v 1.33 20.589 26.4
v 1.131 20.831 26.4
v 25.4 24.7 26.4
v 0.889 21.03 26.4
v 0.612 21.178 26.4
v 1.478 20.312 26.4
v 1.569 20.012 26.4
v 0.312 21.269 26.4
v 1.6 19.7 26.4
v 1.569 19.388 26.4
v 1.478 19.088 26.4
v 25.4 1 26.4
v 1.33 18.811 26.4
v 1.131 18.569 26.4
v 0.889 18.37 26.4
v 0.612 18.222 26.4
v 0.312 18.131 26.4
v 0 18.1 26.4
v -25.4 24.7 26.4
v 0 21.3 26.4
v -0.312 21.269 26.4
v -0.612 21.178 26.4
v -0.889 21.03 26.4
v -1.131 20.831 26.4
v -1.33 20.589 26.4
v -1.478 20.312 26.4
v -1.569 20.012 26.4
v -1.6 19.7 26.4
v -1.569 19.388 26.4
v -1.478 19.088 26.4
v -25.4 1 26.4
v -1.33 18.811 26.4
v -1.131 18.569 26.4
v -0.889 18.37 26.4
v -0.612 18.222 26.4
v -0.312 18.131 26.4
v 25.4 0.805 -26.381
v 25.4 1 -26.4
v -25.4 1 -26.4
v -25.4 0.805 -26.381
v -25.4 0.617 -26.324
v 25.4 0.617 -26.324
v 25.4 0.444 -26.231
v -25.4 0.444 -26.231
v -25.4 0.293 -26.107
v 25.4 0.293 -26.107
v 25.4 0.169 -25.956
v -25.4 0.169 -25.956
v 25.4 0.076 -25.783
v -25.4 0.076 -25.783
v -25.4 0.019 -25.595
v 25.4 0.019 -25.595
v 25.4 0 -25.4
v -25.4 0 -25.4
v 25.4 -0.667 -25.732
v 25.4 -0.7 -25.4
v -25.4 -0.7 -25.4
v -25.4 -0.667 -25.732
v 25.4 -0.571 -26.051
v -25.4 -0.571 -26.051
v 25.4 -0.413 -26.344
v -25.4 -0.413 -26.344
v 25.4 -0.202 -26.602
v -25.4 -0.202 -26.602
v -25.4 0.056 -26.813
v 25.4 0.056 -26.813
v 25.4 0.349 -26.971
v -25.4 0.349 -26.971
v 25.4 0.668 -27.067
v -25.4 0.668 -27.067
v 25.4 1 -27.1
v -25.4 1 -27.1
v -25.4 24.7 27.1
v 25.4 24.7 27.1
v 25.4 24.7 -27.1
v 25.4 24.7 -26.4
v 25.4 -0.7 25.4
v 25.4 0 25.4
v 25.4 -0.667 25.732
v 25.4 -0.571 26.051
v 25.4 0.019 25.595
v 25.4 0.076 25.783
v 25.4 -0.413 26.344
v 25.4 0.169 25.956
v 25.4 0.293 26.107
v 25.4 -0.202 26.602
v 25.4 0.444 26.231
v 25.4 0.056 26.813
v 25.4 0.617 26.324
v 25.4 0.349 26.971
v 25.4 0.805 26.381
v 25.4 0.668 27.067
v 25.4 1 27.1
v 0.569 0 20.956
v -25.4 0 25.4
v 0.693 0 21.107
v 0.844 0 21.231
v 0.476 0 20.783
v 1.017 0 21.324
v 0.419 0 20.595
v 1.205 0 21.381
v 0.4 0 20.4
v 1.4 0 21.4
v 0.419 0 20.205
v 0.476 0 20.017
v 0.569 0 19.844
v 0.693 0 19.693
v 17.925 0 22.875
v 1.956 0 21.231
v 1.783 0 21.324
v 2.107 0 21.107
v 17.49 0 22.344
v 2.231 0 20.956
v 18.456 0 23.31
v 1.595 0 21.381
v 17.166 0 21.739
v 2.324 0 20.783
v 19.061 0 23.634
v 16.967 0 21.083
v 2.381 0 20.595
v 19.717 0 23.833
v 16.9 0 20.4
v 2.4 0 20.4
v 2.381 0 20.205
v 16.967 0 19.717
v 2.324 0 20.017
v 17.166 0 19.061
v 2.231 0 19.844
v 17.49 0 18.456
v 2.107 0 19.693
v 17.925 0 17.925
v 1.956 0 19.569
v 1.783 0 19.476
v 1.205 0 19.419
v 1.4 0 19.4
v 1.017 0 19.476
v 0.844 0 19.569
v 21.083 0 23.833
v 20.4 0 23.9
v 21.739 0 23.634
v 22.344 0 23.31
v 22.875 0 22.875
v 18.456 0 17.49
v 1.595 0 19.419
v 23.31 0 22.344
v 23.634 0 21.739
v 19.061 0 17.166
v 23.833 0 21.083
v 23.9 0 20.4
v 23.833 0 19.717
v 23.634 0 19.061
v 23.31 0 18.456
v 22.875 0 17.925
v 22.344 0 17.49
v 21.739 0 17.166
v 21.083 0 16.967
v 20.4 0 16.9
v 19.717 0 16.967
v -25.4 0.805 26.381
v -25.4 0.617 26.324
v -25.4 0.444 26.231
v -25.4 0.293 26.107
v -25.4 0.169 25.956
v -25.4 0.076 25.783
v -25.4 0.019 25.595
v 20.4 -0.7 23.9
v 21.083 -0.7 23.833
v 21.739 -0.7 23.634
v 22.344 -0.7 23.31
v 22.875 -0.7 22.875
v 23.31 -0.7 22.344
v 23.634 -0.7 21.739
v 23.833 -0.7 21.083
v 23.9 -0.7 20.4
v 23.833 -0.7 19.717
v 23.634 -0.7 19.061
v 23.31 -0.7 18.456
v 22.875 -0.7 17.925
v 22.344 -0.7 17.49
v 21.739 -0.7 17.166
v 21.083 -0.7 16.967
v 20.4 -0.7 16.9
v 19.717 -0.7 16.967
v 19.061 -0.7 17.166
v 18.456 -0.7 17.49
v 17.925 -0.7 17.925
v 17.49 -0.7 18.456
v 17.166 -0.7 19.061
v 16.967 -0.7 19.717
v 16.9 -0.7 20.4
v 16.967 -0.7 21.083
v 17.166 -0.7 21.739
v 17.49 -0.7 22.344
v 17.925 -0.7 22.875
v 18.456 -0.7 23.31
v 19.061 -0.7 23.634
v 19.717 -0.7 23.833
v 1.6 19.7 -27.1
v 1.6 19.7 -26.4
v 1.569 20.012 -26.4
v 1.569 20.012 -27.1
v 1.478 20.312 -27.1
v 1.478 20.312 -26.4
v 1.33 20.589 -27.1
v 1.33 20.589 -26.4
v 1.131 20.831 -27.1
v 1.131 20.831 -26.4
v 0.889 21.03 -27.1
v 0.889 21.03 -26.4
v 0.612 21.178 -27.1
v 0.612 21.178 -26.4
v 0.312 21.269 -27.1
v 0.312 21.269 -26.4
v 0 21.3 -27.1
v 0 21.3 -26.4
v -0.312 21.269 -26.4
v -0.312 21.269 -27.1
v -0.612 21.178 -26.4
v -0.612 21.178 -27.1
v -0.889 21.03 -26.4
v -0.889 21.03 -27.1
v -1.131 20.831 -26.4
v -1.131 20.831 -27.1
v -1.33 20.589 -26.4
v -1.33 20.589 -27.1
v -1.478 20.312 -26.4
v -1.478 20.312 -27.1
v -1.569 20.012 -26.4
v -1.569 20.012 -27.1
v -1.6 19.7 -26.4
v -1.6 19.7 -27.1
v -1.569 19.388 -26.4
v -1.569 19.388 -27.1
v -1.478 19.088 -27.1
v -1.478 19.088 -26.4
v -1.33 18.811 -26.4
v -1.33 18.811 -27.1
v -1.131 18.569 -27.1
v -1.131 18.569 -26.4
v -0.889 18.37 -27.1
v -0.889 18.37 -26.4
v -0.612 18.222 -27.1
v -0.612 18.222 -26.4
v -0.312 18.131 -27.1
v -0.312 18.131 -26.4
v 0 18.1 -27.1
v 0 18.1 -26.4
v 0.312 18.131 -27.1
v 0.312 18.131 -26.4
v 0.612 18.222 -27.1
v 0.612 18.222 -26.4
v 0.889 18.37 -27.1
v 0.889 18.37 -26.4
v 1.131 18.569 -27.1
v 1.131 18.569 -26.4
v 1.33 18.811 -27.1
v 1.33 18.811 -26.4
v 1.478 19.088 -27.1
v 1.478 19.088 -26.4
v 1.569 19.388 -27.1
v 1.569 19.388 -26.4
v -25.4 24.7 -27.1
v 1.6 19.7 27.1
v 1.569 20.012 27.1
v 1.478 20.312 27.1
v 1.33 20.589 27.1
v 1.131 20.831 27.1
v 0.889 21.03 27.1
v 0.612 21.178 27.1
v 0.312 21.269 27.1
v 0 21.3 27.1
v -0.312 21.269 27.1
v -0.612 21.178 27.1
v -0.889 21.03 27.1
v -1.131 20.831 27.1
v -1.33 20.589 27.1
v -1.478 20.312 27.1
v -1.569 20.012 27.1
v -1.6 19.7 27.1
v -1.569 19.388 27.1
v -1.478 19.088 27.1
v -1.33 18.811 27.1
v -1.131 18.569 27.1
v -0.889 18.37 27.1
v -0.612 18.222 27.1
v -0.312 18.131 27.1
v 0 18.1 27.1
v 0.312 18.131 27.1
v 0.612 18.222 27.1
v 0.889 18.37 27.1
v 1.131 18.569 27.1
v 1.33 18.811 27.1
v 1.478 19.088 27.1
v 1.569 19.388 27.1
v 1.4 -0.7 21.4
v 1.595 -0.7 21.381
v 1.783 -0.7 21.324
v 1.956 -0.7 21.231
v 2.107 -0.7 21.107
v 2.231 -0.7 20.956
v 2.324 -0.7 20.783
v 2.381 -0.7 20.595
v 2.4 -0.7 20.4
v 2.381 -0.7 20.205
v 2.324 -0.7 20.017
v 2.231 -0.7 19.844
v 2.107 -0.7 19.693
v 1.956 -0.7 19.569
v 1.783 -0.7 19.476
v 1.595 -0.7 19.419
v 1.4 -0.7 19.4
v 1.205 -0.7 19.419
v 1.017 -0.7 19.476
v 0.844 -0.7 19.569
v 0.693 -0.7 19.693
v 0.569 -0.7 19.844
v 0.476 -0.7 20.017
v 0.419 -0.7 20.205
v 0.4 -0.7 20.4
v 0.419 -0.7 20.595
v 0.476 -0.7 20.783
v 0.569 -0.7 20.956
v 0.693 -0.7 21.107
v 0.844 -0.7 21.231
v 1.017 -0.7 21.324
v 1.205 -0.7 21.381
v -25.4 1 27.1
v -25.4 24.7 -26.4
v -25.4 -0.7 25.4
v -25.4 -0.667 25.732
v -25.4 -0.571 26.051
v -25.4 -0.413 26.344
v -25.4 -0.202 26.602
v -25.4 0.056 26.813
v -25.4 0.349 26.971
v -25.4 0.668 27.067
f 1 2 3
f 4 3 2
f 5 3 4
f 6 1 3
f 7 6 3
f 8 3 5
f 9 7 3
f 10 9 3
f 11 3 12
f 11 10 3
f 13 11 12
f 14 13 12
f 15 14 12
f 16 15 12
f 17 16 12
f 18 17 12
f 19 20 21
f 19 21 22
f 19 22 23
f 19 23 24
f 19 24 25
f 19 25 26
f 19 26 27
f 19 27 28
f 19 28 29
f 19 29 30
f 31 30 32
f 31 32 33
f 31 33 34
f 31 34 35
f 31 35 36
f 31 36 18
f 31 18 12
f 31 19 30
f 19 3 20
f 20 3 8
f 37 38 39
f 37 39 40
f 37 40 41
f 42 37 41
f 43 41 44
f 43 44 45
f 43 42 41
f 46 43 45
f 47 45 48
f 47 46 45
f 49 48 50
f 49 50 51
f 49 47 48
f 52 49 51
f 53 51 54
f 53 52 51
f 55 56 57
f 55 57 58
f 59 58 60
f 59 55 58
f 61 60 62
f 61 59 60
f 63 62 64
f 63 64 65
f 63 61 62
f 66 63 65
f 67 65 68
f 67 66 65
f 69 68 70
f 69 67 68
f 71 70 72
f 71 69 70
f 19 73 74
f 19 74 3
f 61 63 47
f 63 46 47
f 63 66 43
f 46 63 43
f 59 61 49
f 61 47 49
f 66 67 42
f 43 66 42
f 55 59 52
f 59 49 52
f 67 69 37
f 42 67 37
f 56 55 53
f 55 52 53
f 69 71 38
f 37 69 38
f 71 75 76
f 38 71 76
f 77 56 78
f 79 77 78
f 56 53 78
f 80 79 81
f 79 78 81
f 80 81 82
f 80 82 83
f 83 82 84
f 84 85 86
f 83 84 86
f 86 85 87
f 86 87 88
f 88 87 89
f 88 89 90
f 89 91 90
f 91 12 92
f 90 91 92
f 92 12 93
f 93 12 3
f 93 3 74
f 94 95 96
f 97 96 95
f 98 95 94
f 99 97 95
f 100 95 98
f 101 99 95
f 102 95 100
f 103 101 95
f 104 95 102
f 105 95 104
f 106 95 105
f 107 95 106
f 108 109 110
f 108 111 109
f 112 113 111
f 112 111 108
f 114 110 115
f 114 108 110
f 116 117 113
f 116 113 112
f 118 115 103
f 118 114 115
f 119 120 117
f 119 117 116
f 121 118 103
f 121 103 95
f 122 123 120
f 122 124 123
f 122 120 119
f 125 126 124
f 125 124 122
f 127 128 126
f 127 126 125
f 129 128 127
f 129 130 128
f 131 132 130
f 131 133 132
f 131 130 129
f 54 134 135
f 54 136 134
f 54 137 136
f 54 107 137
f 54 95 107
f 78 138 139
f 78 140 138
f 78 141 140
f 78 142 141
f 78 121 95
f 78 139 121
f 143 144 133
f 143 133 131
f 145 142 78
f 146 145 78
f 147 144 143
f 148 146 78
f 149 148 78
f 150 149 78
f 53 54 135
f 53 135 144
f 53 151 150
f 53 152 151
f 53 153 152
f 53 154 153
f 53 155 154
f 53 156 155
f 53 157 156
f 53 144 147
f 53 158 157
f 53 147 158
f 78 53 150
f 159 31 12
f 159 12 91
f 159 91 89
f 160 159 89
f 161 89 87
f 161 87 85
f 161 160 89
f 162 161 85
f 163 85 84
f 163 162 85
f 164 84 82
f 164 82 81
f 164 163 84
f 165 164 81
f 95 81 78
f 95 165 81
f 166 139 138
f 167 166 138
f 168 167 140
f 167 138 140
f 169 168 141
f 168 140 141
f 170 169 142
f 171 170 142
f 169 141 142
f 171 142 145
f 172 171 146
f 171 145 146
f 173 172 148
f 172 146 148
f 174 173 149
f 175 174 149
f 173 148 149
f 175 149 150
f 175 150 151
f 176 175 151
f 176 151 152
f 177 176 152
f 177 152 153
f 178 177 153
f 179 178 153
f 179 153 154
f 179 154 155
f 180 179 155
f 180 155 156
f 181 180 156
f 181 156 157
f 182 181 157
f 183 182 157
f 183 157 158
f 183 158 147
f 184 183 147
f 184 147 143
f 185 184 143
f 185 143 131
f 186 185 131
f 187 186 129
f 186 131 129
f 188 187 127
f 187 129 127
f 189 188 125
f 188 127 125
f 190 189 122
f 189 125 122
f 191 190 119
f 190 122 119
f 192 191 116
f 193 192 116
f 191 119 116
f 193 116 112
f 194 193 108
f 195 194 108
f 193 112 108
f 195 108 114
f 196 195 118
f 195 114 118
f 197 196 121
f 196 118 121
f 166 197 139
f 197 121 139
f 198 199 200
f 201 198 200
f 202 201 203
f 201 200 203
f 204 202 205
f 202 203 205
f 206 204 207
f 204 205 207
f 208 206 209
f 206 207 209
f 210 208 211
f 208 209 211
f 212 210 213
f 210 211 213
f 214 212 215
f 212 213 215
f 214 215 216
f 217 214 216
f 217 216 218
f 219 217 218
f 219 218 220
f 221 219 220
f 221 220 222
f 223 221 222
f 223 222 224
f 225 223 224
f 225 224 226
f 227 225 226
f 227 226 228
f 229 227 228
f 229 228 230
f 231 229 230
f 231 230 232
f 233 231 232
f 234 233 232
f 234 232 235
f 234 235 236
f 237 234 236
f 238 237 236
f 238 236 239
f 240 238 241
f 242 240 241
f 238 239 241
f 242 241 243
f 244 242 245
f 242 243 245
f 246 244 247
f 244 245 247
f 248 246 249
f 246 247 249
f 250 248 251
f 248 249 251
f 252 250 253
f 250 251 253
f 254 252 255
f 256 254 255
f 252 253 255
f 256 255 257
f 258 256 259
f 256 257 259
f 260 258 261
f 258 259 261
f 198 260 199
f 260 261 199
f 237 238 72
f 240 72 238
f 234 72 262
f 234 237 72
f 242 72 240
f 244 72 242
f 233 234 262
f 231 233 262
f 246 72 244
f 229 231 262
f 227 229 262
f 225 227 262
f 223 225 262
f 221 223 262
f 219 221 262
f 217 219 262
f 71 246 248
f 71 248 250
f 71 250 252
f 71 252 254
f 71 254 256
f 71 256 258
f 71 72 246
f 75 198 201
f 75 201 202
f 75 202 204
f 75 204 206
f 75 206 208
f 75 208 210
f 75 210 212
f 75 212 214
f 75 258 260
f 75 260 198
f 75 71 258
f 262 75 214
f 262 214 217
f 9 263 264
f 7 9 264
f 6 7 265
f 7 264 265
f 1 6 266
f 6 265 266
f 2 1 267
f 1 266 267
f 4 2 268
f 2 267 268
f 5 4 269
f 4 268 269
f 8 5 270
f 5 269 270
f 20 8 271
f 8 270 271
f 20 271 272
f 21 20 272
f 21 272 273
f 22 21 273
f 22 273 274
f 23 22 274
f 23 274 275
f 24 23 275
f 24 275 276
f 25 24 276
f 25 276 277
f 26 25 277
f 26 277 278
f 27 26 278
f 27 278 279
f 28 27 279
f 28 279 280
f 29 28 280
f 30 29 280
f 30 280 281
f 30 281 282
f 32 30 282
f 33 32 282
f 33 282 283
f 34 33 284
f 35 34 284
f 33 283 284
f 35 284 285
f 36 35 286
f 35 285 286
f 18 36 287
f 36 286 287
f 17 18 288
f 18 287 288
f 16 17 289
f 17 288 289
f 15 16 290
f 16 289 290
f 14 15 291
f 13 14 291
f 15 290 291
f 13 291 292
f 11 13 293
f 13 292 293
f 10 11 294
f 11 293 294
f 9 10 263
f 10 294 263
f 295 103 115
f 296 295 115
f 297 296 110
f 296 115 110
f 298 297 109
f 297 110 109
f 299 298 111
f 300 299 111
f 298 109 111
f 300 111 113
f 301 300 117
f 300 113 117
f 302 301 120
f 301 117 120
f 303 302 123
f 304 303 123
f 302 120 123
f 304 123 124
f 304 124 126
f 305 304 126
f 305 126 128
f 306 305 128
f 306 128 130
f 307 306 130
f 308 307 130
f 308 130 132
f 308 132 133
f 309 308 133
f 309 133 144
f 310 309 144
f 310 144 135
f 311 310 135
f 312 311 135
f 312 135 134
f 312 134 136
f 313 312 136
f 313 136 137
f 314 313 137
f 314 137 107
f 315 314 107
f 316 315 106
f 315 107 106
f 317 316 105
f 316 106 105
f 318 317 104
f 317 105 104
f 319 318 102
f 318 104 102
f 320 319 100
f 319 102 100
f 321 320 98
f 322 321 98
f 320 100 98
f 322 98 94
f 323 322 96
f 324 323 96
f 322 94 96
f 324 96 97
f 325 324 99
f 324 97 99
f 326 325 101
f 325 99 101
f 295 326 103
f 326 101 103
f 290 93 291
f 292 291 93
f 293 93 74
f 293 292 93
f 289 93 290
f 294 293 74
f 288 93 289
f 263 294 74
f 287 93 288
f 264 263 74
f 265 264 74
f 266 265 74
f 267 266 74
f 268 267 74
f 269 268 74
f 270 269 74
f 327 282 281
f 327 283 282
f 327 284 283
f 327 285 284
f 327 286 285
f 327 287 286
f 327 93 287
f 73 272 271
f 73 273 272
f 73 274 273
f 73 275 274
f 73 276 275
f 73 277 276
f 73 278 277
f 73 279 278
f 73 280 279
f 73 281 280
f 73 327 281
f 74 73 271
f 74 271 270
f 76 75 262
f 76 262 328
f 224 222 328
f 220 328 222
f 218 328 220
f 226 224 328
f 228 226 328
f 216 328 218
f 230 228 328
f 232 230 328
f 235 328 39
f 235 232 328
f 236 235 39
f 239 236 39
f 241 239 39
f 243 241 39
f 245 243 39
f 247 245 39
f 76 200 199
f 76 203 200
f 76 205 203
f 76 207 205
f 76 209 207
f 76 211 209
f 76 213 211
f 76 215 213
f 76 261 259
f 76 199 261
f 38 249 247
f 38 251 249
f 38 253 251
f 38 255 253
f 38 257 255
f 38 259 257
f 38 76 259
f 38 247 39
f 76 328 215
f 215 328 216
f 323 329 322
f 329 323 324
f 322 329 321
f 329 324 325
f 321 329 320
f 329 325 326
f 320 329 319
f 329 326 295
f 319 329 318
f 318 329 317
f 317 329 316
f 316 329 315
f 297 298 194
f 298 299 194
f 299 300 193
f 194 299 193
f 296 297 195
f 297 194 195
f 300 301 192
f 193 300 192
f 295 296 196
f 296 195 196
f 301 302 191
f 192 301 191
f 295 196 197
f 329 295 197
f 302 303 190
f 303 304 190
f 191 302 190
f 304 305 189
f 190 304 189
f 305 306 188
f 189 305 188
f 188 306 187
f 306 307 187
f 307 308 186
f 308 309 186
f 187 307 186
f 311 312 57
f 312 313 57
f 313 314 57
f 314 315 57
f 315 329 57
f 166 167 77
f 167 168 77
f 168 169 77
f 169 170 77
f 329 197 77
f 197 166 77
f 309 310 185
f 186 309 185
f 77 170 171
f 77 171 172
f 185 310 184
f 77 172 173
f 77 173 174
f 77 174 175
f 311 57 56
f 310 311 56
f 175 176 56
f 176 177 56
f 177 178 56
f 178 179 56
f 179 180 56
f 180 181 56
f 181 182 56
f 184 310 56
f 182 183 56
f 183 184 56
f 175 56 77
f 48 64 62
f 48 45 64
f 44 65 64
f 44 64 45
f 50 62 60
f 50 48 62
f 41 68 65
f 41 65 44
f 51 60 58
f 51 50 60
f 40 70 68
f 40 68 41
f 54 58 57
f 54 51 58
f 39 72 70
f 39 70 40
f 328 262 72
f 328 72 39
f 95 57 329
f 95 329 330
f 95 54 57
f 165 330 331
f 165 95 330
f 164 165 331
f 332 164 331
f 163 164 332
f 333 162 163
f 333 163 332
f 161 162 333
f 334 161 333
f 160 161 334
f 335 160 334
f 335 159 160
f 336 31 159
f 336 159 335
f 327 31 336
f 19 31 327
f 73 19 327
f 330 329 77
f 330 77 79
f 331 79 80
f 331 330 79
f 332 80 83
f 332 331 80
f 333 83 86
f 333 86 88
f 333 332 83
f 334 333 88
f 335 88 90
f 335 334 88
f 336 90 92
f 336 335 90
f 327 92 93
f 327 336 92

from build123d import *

# Parameters (mm, degrees)
SKETCH1_W               = 50.8
SKETCH1_H               = 50.8
BASE_FLANGE1_DEPTH      = 0.7
EDGE_FLANGE1_DEPTH      = 50.8
EDGE_FLANGE1_BEND_DEPTH = 50.8
SKETCH12_R              = 3.5
CUT_EXTRUDE1_DEPTH      = 45.605605029
SKETCH13_R              = 1
CUT_EXTRUDE2_DEPTH      = 45.605605029
SKETCH14_R              = 1.6
CUT_EXTRUDE3_DEPTH      = 65.752528908


# Sheet-metal steps are written as plain solids
with BuildPart() as part:
    # Sketch1 → Base-Flange1 (new body)
    with BuildSketch(Plane(origin=(0, 0, 0), x_dir=(1, 0, 0), z_dir=(0, 1, 0))):
        Rectangle(SKETCH1_W, SKETCH1_H)
    extrude(amount=-BASE_FLANGE1_DEPTH)

    # Edge-Flange1 section (across the edge) → Edge-Flange1 (add)
    with BuildSketch(Plane(origin=(25.4, 0, -26.4), x_dir=(0, 0, 1), z_dir=(-1, 0, 0))):
        with BuildLine():
            Line((-0.7, 1), (-0.7, 24.7))
            Line((-0.7, 24.7), (0, 24.7))
            Line((0, 24.7), (0, 1))
            ThreePointArc((0, 1), (0.292893219, 0.292893219), (1, 0))
            Line((1, 0), (1, -0.7))
            ThreePointArc((1, -0.7), (-0.202081528, -0.202081528), (-0.7, 1))
        make_face()
    extrude(amount=EDGE_FLANGE1_DEPTH)

    # Edge-Flange1 section 2 (across the edge) → Edge-Flange1 bend (add)
    with BuildSketch(Plane(origin=(-25.4, 0, 26.4), x_dir=(0, 0, -1), z_dir=(1, 0, 0))):
        with BuildLine():
            Line((-0.7, 1), (-0.7, 24.7))
            Line((-0.7, 24.7), (0, 24.7))
            Line((0, 24.7), (0, 1))
            ThreePointArc((0, 1), (0.292893219, 0.292893219), (1, 0))
            Line((1, 0), (1, -0.7))
            ThreePointArc((1, -0.7), (-0.202081528, -0.202081528), (-0.7, 1))
        make_face()
    extrude(amount=EDGE_FLANGE1_BEND_DEPTH)

    # Sketch12 → Cut-Extrude1 (cut, through all)
    with BuildSketch(Plane(origin=(0, 0, 0), x_dir=(1, 0, 0), z_dir=(0, 1, 0))):
        with Locations(Location((20.4, -20.4, 0), (0, 0, 270))):
            Circle(SKETCH12_R)
    extrude(amount=-CUT_EXTRUDE1_DEPTH, mode=Mode.SUBTRACT)

    # Sketch13 → Cut-Extrude2 (cut, through all)
    with BuildSketch(Plane(origin=(0, 0, 0), x_dir=(1, 0, 0), z_dir=(0, 1, 0))):
        with Locations(Location((1.4, -20.4, 0), (0, 0, 270))):
            Circle(SKETCH13_R)
    extrude(amount=-CUT_EXTRUDE2_DEPTH, mode=Mode.SUBTRACT)

    # Sketch14 → Cut-Extrude3 (cut, through all)
    with BuildSketch(Plane.XY.offset(27.1)):
        with Locations((0, 19.7)):
            Circle(SKETCH14_R)
    extrude(amount=-CUT_EXTRUDE3_DEPTH, mode=Mode.SUBTRACT)


solid = part.part
